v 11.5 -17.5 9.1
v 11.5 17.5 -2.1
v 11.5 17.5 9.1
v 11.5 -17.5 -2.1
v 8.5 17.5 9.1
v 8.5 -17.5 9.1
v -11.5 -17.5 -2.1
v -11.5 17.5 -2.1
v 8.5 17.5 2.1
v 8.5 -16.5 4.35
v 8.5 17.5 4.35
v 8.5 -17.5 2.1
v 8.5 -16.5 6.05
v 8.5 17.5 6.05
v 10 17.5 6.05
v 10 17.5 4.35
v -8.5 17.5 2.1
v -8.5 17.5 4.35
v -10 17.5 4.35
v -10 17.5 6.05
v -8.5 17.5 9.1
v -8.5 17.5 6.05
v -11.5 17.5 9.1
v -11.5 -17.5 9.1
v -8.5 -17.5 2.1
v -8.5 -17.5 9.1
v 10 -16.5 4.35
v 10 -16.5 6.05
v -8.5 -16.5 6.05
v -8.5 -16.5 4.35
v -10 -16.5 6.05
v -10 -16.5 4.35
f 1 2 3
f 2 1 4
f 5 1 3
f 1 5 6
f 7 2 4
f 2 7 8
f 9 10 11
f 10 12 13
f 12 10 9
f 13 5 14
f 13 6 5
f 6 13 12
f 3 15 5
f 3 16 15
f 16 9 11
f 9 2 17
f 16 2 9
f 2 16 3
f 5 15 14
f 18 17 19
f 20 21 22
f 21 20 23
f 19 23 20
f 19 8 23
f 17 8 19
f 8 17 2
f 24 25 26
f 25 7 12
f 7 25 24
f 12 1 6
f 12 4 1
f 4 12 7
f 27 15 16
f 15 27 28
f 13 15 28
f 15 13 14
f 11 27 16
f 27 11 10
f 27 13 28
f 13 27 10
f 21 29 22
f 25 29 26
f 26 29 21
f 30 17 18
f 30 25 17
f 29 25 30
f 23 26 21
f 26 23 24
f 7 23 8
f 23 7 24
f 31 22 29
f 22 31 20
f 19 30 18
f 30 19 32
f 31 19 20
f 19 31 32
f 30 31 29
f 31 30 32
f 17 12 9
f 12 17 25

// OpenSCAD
// file: ../robot_settings.scad
main_box_x = 95; // 96
main_box_y = 102;
main_box_z = 74; // 74.5
wall_thickness = 2;

rail_gap = 2;
rail_inset = 7;

rail_thickness = 7;
rail_length = 250;
rail_width = 200;

raspberry_pi_screw_seperation_y = 57;
raspberry_pi_screw_seperation_z = 48;
raspberry_pi_peg_h = 5;

battery_box_peg_h = 6;
battery_box_peg_d = 8;
battery_box_peg_cutout = 5;

gears_module = 1;
pinion_gear_teeth = 32;
pinion_gear_width = 5;
pinion_gear_bore = 8;

gears_setback_distance = 25;
gear_post_height = 2 * pinion_gear_width + rail_thickness + 8 ;

steering_motor_mount_x = 45;
steering_motor_mount_y = 36;
steering_motor_mount_z = 18;
steering_motor_mount_setback_distance = gears_setback_distance + 16;

dc_motor_drivertype = "Teyleten"; // Teyleten
isAdafruit = (dc_motor_drivertype == "Adafruit");

drv8871_x = isAdafruit ? 20.3 : 21.6;
drv8871_y = isAdafruit ?  24 : 25;

drv8871_z = 2;
drv8871_screw_d = 2.5;
drv8871_solder_points_z = 2;

drv8871mount_edge_x = 1.5;
drv8871mount_edge_wall = 3;
drv8871mount_z = 5;
drv8871mount_x = drv8871_x +  drv8871mount_edge_wall - 2* drv8871mount_edge_x;
drv8871mount_y = 19;

drv8871_screw_distance = 15.64;
drv8871_solder_points_d = 1.66;
drv8871_solder_offset_y = 4.4;
drv8871_solder_inner_points_distance = 5;
drv8871_solder_outer_points_distance = 12;

dc_motor_housing_minus_encoder_z = 48;
dc_motor_encoder_z = 9.33;
dc_motor_encoder_wheel_d = 13.4;
dc_motor_encoder_wheel_thickness = 5;
dc_motor_encoder_wheel_gap = 3;
dc_motor_encoder_circuit_thickness = 2;
dc_motor_cutout_d = 24.8;
dc_motor_cutout_z = 19.5;

dc_motor_screw_head_z = 2;
dc_motor_screw_head_d = 5.6;
dc_motor_screw_d = 3.2;
dc_motor_screw_offset = 8.5;

dc_motor_axle_ring_z = 3;
dc_motor_axle_ring_d = 7.2;
dc_motor_axle_cutout_d = 4.5;
dc_motor_axle_cutout_z = 10;
dc_motor_axle_notch_cutout = 0.4;
dc_motor_axle_notch_cutout_z = 6;

pdmount_x = 20;
pdmount_y = 30;
pdmount_z = 2;
pdmount_edge_x = 1.5;
pdmount_edge_wall = 3;

steering_shaft_z = 45;
steering_shaft_d = 7;
steering_shaft_motor_fitting_d = 9;
coupler_length = 24.6;
coupler_diameter = 14;
coupler_screw_d = 4;
coupler_screw_z_offset = 5;
coupler_gear_side_insert = 12.6;
steering_shaft_with_coupler_z = steering_shaft_z - coupler_gear_side_insert;

lidar_mount_y = 110;
lidar_mount_x = 65 + 20;
lidar_narrow_screws = 40;
lidar_wide_screws = 56;
lidar_front_to_back_screws = 70;
lidar_screw_d = 3;
lidar_circuitboard_x = 20;
lidar_circuitboard_y = 35;
lidar_circuitboard_z = 1.2;
lidar_cord_length = 29;

ball_bearing_height = 7;
ball_bearing_outer_diameter = 22;
ball_bearing_inner_diameter = 8;

 armature_holder_height = 20;
 armature_holder_thickness = 8;
pull_bar_peg_r = 3.2;
apparatus_locking_peg_d = 4;

rack_module = 1;
rack_length = main_box_x / 2;
rack_height = 10;
rack_width = 10;
rack_teeth = 30;
rack_bore = 3;

pull_bar_length = rail_width / 2 - rack_length + 1;

// tire hardware
axle_length = 30;
axle_reciever_inner_diameter = 7.75;
axle_reciever_length = 18.8;
axle_notch_length = 7;
axle_notch_cutout = 2.4;

// power distribution bar
power_bar_cutout_x = 96;
power_bar_y = 19.1;
power_bar_z = 1.5;
power_bar_screw_distance = 91.4;
power_bar_screw_d = 2.8;
power_bar_standoff_z = 5;
power_bar_standoff_d = 6.83;

// breadboard
breadboard_wall_thickness = 3;
breadboard_width = 55;
breadboard_length = 83;
breadboard_height = 10.5;
breadboard_notch_width = 4.2;
breadboard_longside_notch_separation = 58.2 - breadboard_notch_width / 2;
breadboard_shortside_notch_separation = 26.3 - breadboard_notch_width;

pico_expander_width = 63;
pico_expander_height = 57;
pico_screw_hole_offset = 3;
pico_screw_hole_d = 2.5;

usbhub_thickness = 11.7;
usbhub_depth = 37.5;
usbhub_width = 86.7;
usbhub_end_port_width = 14.8;
usbhub_end_port_height = 12;
usbhub_front_face_safe_zone_left = 15;
usbhub_front_face_safe_zone_right = 14.8;

switch_w = 16;
switch_cutout_d = 12.2;
switch_bump_h = 2;
switch_bump_l = 18.2;
// main file
include <../robot_settings.scad>
$fn = 50;

module lidar_circuitboard_mount()
{
  cube([lidar_circuitboard_x, lidar_circuitboard_y, lidar_circuitboard_z + 3], center = true);
  
  difference() {
  translate([lidar_circuitboard_x / 2, 0, 3.5])
  cube([drv8871mount_edge_wall, lidar_circuitboard_y, lidar_circuitboard_z + 10], center = true);
  
  translate([0, 1, lidar_circuitboard_z + drv8871_solder_points_z + 2])
  cube([lidar_circuitboard_x, lidar_circuitboard_y, lidar_circuitboard_z + .5], center = true);
  }
  
  difference() {
  translate([-lidar_circuitboard_x / 2, 0, 3.5])
  cube([drv8871mount_edge_wall, lidar_circuitboard_y, lidar_circuitboard_z + 10], center = true);
  
  translate([0, 1, lidar_circuitboard_z + drv8871_solder_points_z + 2])
  cube([lidar_circuitboard_x, lidar_circuitboard_y, lidar_circuitboard_z + .5], center = true);
  }
  
}

lidar_circuitboard_mount();
